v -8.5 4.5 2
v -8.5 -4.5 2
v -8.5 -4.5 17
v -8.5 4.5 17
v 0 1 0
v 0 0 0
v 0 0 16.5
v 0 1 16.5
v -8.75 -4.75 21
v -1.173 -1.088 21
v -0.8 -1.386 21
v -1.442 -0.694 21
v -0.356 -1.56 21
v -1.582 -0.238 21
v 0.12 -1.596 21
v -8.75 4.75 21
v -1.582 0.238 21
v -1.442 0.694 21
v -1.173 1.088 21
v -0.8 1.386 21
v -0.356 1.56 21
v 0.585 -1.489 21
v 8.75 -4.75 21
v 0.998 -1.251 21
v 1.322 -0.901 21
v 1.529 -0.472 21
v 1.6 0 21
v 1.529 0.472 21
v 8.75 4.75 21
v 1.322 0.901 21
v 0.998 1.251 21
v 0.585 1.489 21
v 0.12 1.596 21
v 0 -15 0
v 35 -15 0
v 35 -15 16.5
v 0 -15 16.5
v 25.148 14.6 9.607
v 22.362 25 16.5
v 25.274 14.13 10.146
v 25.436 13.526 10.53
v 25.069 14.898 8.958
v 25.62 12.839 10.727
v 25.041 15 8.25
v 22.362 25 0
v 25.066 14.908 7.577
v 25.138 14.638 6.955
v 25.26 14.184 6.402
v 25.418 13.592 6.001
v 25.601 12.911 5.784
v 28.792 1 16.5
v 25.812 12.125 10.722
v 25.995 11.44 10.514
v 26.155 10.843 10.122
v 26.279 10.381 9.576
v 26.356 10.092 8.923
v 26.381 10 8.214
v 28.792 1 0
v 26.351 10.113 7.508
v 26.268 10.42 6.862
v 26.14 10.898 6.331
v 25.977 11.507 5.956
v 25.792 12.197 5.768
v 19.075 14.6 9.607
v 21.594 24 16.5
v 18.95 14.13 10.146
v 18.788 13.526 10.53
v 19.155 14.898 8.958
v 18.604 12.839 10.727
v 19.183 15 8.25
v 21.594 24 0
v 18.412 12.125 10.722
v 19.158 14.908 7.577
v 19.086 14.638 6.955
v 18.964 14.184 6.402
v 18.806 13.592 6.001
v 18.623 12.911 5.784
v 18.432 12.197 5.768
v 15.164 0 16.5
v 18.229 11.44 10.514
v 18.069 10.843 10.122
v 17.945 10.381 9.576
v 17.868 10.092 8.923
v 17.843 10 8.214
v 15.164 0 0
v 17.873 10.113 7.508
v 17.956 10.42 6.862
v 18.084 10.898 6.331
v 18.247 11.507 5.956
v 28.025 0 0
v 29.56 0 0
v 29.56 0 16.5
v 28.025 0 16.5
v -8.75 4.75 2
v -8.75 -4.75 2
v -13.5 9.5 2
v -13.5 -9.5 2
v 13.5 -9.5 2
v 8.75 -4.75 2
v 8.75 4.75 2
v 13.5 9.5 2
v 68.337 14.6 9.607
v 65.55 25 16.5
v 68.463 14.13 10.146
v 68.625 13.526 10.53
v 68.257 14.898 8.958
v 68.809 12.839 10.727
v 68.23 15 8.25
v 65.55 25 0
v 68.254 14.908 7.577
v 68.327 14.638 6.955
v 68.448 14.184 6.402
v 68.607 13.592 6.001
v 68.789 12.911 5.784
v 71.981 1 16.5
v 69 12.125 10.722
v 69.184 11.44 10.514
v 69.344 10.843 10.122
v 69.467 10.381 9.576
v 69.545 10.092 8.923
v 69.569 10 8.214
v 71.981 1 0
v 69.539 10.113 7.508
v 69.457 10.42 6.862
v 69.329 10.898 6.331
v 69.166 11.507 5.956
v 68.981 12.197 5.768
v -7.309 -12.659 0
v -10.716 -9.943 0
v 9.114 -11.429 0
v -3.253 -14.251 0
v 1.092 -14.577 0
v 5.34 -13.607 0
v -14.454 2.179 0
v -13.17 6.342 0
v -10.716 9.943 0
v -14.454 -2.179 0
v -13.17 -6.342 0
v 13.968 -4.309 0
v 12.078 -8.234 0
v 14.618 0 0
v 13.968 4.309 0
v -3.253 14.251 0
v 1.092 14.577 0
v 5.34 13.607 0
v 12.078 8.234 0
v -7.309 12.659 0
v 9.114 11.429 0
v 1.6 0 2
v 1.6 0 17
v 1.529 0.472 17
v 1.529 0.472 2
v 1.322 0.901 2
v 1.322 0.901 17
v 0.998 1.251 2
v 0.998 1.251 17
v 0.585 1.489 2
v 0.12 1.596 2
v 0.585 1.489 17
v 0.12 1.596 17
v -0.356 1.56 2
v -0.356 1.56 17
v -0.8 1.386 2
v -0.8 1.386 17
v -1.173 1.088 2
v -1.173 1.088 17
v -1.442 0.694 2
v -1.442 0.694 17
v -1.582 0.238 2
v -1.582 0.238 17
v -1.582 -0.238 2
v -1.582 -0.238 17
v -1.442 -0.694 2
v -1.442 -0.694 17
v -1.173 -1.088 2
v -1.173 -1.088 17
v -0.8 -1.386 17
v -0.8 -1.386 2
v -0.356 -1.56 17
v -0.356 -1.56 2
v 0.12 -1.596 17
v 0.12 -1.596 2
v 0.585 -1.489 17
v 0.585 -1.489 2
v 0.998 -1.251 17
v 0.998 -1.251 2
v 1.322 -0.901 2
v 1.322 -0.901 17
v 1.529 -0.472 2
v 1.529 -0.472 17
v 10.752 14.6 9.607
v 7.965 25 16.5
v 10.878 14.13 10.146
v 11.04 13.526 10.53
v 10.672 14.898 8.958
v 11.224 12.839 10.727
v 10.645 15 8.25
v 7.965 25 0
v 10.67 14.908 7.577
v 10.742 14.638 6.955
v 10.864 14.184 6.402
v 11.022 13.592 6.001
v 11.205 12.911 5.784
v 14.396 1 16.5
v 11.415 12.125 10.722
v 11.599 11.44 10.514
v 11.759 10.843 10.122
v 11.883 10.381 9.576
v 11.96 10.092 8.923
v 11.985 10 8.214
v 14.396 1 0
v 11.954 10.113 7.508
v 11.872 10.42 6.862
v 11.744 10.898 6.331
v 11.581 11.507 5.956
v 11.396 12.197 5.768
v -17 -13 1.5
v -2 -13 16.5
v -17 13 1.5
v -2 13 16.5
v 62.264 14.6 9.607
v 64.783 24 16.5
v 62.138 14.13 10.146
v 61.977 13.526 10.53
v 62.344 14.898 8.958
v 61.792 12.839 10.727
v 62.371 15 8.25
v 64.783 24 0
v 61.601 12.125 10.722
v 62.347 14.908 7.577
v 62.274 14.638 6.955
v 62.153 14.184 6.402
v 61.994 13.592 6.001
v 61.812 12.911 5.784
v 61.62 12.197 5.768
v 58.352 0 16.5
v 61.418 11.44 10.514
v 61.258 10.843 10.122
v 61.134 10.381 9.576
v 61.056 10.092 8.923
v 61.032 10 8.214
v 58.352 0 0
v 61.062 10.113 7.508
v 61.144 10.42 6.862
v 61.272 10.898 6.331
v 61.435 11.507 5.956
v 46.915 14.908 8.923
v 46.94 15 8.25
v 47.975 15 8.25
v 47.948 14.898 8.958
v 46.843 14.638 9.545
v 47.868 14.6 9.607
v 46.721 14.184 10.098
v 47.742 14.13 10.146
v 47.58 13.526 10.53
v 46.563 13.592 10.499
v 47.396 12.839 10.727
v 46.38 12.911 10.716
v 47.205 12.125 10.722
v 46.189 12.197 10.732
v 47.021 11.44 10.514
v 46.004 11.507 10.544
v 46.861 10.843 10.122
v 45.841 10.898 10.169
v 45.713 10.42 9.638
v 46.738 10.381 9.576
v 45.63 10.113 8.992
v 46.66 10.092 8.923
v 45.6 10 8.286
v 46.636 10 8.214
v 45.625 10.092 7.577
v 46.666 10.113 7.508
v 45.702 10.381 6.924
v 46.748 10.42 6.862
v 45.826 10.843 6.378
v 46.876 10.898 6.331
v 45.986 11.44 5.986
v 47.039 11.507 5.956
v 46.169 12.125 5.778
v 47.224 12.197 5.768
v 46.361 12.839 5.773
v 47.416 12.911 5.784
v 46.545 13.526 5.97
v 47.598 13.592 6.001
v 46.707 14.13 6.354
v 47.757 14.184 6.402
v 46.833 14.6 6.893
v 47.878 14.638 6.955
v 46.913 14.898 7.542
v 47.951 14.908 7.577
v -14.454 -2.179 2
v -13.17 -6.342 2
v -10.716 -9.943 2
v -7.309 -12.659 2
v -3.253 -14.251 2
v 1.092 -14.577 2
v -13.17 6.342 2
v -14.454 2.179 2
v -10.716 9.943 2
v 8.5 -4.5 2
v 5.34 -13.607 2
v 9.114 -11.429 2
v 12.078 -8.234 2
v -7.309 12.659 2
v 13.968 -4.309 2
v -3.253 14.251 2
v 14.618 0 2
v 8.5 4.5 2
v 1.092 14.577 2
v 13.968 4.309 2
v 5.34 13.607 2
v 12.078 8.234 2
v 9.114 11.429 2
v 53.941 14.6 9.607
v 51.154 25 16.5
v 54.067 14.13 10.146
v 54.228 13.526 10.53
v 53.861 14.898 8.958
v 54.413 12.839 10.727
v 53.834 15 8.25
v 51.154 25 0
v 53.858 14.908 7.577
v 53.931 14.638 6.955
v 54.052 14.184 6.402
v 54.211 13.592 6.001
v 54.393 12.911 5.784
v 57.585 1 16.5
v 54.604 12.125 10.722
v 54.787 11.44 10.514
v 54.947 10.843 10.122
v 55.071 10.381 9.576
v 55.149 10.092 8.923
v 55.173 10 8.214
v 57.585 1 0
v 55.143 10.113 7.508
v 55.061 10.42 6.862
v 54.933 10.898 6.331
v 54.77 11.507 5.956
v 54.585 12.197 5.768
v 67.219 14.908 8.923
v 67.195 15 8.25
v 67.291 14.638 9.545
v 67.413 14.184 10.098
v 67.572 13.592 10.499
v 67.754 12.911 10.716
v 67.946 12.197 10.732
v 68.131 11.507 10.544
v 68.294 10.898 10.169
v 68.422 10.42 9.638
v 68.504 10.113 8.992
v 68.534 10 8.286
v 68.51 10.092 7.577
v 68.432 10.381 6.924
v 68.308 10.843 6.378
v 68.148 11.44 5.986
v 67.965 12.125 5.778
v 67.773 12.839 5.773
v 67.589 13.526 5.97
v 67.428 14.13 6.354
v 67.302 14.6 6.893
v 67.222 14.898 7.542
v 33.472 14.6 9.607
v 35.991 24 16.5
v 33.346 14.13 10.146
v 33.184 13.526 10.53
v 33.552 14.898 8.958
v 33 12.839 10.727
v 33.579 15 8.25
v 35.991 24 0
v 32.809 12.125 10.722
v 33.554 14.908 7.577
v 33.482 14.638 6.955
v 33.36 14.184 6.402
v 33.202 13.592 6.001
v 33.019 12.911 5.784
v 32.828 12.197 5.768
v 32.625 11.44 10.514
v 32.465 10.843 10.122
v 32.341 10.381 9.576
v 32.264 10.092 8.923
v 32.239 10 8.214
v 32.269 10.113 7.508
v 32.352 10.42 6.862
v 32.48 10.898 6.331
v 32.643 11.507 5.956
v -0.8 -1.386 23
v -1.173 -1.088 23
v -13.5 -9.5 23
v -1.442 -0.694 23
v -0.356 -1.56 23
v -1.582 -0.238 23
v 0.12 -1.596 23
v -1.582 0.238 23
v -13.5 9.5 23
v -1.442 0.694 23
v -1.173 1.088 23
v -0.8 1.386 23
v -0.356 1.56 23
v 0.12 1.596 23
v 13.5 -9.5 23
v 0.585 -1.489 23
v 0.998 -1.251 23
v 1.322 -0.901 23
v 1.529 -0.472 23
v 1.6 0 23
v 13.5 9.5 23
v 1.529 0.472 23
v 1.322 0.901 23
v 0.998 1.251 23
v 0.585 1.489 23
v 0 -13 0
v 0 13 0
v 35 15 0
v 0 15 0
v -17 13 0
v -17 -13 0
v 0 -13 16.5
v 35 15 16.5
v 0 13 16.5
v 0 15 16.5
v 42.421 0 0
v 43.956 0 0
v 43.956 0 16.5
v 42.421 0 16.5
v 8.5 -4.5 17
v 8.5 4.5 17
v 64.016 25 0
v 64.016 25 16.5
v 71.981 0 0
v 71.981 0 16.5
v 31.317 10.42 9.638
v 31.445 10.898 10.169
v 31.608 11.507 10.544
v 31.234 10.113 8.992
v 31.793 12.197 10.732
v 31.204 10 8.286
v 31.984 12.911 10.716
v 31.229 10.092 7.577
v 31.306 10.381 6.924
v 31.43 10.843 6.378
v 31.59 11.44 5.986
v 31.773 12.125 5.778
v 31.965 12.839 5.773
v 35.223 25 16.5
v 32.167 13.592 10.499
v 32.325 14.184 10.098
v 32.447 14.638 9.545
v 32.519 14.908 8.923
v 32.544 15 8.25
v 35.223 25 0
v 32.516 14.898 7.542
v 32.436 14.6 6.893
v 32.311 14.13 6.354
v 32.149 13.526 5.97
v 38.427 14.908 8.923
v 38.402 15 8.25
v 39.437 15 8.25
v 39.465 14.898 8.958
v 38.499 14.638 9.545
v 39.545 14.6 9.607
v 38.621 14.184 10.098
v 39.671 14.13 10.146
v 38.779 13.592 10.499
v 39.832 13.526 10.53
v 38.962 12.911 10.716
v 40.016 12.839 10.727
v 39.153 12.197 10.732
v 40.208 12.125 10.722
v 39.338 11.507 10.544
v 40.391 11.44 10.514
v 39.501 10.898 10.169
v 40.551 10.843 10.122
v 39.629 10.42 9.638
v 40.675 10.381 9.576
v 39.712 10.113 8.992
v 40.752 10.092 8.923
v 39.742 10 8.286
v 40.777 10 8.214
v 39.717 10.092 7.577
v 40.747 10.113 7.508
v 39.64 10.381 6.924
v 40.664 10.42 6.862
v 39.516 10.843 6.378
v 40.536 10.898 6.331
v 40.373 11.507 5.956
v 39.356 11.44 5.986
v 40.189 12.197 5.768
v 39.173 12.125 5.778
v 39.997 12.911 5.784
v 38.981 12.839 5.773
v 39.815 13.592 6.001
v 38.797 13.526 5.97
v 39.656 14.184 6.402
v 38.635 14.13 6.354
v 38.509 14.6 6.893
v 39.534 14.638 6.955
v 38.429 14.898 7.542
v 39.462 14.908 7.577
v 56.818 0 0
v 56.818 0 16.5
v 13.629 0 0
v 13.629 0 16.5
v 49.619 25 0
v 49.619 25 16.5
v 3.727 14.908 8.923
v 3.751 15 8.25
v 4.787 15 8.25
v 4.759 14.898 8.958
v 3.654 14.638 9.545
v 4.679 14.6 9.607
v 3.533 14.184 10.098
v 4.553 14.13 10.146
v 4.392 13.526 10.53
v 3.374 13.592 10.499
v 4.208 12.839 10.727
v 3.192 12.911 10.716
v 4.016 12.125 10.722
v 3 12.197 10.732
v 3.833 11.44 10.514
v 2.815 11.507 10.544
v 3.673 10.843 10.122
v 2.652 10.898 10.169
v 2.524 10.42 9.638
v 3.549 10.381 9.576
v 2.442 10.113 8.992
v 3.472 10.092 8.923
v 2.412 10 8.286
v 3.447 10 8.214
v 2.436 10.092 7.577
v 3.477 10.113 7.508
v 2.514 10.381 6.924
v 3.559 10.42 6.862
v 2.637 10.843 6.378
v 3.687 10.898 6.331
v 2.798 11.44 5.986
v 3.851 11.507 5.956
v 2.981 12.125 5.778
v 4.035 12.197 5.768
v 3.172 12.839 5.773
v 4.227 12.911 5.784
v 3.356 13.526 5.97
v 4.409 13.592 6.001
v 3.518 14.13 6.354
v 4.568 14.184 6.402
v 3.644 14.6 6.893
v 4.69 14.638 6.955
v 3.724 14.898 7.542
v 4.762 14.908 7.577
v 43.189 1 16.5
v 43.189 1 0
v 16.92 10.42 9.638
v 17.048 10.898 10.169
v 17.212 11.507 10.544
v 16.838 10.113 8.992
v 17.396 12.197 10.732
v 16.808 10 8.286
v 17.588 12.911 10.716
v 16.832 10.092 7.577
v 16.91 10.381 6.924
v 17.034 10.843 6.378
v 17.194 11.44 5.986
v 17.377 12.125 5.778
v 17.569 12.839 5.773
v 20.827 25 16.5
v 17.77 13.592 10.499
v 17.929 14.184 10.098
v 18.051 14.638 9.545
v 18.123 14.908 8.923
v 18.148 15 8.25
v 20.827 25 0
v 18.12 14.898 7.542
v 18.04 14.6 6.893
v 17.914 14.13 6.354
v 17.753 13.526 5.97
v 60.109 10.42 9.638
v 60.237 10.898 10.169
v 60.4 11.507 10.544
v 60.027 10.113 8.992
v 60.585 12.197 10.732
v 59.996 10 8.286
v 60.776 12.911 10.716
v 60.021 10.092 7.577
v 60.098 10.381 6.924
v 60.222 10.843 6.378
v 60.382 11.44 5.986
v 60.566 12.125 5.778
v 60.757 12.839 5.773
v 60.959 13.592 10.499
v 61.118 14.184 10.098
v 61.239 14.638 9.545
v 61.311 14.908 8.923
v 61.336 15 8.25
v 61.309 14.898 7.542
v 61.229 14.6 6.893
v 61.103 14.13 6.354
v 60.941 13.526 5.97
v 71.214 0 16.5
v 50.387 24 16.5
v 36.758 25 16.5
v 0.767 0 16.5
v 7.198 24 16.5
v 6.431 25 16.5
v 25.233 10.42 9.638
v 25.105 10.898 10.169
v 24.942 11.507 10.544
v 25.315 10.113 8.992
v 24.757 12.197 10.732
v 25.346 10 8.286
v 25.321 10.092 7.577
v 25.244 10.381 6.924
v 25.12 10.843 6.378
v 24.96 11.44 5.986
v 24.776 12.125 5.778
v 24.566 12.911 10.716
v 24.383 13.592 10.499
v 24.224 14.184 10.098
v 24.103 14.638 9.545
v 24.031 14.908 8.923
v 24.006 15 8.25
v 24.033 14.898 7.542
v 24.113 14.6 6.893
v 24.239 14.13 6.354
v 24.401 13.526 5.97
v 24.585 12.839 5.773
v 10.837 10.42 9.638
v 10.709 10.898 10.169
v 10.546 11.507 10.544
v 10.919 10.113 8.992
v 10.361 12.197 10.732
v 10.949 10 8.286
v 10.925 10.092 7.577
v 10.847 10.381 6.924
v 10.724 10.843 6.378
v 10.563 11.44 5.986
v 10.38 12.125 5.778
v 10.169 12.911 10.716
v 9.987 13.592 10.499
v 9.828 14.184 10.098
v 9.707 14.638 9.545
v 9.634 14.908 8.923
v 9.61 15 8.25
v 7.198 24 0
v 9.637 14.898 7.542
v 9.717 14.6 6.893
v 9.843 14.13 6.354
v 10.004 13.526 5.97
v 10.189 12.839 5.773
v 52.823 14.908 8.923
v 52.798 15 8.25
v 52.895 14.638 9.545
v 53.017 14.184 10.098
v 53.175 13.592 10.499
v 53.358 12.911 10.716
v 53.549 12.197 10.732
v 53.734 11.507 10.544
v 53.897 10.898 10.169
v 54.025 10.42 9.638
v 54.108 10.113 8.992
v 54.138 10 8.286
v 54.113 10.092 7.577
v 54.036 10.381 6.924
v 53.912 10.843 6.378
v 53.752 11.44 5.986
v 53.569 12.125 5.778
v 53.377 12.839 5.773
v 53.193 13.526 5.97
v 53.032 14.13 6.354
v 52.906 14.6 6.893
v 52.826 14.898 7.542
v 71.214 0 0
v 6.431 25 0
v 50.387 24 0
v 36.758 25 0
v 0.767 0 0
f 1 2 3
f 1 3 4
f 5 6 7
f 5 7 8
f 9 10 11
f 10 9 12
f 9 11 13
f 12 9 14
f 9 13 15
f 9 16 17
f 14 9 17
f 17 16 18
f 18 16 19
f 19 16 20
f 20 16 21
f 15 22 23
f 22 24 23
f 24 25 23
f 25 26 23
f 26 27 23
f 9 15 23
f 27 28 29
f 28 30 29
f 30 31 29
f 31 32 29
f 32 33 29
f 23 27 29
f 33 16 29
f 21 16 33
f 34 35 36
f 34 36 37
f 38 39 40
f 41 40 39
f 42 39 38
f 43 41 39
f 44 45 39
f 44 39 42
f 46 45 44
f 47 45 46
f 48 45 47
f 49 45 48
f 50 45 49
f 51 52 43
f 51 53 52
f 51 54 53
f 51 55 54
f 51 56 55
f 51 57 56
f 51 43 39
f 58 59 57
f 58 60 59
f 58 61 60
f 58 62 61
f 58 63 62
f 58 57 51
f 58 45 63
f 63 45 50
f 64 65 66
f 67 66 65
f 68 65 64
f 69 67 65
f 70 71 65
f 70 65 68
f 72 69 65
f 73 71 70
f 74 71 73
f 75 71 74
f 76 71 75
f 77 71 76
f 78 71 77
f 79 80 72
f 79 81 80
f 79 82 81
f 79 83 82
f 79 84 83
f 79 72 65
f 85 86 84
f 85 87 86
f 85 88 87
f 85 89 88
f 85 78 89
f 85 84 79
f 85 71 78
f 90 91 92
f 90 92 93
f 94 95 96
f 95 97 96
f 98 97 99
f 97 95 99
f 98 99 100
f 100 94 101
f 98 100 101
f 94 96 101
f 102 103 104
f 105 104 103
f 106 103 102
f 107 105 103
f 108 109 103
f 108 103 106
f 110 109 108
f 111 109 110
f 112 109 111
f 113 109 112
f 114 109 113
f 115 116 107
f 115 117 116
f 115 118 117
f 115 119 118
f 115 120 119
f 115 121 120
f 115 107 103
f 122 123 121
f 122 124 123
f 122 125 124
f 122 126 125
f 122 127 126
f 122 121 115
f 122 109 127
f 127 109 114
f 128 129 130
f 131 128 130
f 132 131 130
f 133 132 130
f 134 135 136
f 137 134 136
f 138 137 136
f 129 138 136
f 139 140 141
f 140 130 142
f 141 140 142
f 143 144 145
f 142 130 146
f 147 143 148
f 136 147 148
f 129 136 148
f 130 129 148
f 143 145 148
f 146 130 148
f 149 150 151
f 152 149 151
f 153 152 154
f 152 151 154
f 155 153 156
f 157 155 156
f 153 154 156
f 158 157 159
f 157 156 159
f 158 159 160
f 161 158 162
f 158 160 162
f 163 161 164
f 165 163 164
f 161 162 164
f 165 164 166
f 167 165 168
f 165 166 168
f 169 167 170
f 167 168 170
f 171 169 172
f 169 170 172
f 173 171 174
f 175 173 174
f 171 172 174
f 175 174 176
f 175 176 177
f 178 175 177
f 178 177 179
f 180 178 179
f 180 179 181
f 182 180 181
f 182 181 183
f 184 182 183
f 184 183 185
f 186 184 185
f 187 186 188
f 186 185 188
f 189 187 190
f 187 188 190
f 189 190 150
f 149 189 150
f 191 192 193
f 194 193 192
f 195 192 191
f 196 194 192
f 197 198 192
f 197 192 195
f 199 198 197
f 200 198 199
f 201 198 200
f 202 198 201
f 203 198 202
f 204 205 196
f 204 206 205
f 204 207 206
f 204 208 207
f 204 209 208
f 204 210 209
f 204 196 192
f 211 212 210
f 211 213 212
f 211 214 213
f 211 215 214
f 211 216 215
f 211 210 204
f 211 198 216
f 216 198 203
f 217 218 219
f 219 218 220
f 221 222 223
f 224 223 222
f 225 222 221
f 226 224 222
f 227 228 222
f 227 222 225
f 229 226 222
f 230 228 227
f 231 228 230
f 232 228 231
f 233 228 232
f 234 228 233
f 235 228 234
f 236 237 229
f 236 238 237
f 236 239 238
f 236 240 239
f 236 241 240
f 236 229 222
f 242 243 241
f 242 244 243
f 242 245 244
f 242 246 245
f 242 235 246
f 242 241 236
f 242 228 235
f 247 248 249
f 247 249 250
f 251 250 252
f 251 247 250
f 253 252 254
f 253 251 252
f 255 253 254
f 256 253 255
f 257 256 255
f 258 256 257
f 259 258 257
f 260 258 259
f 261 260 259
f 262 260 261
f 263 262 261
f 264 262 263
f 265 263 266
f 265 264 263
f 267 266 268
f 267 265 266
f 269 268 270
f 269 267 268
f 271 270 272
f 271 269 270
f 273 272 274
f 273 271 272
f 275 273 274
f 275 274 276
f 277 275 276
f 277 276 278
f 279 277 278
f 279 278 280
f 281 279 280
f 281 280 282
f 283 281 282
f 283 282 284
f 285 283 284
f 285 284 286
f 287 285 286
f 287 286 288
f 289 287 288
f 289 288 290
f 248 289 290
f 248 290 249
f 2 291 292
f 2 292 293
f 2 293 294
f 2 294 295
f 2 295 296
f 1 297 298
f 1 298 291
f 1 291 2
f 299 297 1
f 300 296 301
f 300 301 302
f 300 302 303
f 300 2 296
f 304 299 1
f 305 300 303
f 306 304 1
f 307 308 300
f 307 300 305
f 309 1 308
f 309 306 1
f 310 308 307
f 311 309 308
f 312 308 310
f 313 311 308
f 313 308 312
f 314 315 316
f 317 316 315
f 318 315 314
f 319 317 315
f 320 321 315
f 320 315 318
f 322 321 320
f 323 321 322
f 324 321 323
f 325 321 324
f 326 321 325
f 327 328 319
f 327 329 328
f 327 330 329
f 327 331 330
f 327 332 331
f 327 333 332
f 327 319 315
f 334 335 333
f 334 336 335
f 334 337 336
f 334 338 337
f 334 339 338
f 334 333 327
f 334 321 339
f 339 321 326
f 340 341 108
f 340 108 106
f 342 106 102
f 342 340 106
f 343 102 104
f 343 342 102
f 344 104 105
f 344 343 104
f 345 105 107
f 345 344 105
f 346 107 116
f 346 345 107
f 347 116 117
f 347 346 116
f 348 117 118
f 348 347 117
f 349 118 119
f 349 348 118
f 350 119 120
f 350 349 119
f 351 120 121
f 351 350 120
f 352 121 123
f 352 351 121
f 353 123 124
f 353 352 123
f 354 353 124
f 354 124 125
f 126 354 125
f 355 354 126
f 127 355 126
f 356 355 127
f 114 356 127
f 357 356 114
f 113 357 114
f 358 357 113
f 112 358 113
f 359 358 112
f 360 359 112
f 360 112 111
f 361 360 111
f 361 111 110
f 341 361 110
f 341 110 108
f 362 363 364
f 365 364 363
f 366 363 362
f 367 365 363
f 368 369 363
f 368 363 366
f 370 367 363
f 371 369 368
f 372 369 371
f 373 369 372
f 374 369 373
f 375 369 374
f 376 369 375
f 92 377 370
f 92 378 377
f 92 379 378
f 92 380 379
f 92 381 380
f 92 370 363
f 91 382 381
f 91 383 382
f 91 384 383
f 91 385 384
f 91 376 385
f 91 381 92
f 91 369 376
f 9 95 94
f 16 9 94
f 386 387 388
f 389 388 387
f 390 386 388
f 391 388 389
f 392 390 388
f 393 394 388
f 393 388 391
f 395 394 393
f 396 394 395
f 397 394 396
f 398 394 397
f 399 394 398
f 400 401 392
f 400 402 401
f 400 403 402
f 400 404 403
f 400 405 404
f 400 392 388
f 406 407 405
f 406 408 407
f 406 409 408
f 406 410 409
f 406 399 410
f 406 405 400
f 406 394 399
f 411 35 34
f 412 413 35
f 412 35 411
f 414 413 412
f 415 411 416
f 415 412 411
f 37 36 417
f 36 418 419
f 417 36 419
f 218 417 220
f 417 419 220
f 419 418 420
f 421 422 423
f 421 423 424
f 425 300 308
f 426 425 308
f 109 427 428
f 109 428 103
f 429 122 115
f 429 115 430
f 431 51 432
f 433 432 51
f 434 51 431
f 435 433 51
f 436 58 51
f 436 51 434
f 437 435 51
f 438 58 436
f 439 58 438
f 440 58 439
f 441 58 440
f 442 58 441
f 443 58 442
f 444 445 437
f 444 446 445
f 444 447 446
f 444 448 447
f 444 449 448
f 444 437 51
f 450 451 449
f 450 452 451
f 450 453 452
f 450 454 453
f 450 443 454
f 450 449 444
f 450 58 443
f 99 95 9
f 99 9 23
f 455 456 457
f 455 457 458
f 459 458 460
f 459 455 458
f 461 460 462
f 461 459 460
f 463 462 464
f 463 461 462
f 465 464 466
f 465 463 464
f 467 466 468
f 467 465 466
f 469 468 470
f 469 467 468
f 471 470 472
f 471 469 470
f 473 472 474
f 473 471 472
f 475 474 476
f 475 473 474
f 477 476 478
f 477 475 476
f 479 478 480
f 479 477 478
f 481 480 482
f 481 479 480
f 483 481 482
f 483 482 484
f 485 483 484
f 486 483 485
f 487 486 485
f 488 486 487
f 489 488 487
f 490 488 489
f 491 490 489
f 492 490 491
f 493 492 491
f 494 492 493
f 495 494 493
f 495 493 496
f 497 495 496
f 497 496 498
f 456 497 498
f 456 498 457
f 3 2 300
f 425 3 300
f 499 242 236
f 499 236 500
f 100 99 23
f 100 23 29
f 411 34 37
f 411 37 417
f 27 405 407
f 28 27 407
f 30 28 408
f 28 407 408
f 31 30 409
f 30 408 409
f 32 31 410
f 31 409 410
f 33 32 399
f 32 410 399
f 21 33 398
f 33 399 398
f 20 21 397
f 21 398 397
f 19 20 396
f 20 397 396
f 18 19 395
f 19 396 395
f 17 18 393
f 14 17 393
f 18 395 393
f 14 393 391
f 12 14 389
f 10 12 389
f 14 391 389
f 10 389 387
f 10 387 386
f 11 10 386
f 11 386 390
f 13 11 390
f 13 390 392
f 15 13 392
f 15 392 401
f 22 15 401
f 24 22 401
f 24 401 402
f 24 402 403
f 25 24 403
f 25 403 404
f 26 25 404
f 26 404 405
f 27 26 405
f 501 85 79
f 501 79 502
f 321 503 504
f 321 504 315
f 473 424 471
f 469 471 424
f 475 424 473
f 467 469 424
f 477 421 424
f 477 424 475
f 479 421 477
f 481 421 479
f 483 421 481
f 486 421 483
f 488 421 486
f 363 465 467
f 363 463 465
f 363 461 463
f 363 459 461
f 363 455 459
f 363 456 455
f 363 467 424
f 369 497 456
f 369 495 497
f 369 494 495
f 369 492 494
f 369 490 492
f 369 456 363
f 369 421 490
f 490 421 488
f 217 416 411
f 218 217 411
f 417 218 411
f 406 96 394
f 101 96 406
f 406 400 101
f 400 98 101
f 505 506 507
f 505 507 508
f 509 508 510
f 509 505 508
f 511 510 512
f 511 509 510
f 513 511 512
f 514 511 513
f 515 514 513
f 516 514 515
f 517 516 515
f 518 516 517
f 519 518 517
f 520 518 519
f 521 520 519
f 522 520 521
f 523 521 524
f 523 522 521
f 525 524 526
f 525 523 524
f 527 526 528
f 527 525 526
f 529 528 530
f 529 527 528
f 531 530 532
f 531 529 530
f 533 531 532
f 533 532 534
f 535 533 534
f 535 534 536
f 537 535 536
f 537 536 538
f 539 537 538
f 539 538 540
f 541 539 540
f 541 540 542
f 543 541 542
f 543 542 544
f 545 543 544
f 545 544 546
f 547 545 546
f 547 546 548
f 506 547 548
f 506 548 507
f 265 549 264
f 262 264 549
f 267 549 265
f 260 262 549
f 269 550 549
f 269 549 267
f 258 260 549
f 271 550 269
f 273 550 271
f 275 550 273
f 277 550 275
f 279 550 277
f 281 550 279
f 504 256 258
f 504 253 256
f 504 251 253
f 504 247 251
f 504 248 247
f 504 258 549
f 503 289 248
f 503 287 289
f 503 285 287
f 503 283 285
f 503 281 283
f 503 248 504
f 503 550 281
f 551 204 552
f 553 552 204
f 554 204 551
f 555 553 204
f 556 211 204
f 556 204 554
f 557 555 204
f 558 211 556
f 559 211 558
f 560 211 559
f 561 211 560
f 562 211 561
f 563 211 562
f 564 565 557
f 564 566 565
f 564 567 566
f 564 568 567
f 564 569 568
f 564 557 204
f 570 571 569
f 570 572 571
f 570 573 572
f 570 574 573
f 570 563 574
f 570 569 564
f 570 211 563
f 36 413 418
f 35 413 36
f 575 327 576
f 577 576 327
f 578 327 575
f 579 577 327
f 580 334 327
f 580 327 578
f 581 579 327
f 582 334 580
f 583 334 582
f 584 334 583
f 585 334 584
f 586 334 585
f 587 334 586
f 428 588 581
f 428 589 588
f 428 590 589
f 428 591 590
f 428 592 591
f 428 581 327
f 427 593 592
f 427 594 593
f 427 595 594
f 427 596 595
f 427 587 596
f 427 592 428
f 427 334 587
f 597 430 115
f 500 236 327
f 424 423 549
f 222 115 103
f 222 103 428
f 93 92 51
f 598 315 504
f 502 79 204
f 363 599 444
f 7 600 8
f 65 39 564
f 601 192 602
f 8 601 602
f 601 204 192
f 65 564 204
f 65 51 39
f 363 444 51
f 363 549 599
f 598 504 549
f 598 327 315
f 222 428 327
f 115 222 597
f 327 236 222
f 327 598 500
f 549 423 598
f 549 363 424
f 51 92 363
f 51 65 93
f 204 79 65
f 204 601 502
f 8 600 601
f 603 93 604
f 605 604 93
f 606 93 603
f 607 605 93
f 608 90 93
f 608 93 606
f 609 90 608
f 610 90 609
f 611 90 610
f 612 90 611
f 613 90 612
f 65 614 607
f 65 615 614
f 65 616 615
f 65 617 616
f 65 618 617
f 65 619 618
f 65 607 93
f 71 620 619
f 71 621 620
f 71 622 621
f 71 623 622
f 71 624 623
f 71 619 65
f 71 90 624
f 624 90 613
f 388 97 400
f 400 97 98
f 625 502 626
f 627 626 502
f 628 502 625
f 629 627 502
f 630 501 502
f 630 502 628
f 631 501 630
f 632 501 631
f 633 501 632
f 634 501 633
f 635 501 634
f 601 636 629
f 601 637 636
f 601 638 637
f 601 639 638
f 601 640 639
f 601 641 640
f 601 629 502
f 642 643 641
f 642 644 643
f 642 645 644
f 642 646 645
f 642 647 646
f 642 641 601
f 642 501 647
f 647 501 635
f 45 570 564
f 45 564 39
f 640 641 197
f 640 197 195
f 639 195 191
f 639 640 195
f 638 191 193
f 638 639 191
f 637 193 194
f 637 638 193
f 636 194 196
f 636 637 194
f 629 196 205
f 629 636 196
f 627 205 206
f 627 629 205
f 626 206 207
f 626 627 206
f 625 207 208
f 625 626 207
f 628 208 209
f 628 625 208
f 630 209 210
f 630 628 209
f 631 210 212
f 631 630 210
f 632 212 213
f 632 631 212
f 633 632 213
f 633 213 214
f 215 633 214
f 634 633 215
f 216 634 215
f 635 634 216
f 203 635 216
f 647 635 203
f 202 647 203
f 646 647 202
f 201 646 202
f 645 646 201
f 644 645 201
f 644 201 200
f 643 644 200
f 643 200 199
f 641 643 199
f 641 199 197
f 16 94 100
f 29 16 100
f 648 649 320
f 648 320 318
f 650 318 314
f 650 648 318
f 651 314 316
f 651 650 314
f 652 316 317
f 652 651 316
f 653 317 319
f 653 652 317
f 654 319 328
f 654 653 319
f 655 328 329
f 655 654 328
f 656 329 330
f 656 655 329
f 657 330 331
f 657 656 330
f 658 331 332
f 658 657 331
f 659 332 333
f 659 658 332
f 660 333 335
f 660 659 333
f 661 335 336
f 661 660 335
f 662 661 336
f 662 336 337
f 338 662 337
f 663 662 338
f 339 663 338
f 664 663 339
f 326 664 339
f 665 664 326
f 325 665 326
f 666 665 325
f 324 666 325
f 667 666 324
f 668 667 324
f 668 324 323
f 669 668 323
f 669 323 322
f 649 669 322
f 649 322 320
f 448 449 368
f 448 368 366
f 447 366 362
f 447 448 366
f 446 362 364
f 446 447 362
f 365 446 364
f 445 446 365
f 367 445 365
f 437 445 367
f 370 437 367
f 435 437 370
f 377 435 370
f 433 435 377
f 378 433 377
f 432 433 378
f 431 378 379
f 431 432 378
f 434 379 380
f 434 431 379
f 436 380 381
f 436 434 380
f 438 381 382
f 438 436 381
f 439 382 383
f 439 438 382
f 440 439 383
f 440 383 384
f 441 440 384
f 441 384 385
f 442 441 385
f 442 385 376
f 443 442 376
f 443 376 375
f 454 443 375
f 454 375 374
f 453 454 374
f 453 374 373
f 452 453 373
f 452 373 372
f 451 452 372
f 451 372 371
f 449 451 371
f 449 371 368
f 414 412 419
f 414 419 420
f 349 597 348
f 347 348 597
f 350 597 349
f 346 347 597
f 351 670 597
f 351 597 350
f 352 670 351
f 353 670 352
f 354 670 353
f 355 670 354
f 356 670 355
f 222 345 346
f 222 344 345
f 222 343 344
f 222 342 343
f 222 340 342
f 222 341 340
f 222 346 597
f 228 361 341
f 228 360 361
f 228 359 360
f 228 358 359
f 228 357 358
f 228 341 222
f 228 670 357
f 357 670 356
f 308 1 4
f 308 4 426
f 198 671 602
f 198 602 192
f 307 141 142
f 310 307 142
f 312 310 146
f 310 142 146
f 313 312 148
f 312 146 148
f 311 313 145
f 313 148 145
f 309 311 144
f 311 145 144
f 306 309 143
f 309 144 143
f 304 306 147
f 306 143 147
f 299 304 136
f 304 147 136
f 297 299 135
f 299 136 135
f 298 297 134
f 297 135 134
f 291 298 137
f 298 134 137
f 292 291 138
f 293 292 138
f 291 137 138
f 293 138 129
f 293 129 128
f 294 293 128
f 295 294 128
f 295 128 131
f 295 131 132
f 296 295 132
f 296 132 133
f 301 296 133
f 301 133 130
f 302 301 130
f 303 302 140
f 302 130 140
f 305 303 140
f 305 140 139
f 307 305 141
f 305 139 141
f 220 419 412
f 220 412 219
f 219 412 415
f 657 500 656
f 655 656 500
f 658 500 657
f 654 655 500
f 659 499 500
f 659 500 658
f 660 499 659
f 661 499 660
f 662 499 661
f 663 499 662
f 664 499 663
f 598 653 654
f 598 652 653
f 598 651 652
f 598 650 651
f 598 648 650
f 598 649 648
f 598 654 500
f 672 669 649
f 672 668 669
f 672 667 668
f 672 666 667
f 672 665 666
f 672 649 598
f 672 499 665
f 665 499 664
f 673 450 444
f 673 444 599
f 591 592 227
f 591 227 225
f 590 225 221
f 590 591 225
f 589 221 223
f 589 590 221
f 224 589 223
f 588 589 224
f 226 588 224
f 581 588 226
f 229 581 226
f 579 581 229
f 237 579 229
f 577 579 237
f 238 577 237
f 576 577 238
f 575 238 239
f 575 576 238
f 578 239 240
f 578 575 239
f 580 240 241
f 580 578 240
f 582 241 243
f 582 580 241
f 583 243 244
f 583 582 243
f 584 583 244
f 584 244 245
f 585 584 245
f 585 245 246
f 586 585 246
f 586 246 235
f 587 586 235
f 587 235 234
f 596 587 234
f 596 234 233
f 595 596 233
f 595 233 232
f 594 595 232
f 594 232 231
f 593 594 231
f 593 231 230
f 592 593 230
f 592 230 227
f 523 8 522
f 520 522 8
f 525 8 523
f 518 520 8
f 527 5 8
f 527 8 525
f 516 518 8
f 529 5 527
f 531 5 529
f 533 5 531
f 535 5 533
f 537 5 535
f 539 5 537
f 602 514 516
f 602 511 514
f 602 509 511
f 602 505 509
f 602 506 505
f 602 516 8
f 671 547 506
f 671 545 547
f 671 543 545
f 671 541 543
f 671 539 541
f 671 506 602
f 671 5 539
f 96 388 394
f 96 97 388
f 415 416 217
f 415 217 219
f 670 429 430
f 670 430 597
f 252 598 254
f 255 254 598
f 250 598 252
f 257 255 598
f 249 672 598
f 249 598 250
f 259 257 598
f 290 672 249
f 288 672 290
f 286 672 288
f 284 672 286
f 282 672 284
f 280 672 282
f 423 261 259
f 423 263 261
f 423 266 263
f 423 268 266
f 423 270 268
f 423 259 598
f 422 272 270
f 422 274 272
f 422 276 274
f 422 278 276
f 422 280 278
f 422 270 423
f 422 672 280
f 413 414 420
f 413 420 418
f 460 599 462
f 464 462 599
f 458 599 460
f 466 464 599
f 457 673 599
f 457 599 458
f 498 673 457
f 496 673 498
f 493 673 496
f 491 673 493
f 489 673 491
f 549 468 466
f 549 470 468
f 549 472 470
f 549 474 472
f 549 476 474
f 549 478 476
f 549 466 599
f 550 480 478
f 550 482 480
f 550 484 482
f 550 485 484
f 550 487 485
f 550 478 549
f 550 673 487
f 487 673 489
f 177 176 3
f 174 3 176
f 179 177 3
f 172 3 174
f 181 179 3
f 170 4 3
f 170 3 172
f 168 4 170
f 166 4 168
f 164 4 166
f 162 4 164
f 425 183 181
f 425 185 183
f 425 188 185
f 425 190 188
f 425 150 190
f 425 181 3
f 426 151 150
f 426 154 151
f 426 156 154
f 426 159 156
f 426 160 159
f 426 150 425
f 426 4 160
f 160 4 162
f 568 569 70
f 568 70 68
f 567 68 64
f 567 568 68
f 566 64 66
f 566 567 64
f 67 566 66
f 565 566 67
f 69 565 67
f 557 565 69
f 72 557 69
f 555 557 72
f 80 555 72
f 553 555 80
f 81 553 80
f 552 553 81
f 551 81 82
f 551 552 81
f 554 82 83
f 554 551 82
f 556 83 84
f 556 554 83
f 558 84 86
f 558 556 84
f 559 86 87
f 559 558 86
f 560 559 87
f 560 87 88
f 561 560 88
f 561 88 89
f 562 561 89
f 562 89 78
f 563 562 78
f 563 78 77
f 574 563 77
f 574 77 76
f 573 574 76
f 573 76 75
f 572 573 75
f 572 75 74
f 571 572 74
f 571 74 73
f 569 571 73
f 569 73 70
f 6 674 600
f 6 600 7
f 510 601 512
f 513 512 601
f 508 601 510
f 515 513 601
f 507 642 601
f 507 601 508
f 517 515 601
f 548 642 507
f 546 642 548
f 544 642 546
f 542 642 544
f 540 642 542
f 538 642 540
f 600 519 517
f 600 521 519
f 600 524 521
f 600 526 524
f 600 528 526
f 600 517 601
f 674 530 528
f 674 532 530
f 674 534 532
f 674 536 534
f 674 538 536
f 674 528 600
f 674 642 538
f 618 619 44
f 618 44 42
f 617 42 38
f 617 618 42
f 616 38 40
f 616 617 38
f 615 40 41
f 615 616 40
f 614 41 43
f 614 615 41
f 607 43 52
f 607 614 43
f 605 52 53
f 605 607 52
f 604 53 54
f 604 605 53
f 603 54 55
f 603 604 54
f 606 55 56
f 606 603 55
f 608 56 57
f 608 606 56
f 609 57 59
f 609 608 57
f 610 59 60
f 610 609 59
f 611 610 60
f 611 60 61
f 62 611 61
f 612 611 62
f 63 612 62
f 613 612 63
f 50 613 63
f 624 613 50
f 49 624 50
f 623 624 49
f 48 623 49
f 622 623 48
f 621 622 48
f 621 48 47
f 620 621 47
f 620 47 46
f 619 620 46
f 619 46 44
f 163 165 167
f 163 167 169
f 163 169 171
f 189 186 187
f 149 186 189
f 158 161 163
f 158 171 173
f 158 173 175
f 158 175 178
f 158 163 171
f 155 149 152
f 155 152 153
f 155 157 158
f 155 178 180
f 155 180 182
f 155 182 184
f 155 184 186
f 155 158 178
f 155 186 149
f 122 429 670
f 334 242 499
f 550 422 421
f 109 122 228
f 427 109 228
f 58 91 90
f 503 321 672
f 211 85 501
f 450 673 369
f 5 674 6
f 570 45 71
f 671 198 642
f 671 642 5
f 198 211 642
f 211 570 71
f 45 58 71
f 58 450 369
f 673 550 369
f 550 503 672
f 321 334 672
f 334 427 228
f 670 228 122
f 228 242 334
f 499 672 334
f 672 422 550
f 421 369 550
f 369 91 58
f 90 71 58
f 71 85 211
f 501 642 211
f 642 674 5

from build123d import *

# Parameters (mm, degrees)
SKETCH_R             = 14.617692
PAD_DEPTH            = 2
SKETCH001_W          = 17
SKETCH001_H          = 9
PAD001_DEPTH         = 15
SKETCH002_R          = 1.6
POCKET_DEPTH         = 15
PAD002_DEPTH         = 16.5
CHAMFER_SIZE         = 15
PAD003_DEPTH         = 16.5
SKETCH010_R          = 2.5
POCKET002_DEPTH      = 0.001
POCKET002_DEPTH_BACK = -71.982076
SKETCH007_W          = 27
SKETCH007_H          = 19
SKETCH007_W_2        = 17.5
SKETCH007_H_2        = 9.5
PAD004_DEPTH         = 19
SKETCH008_W          = 27
SKETCH008_H          = 19
PAD005_DEPTH         = 2
SKETCH009_R          = 1.6
POCKET001_DEPTH      = 21.001


with BuildPart() as bolt:
    # Sketch → Pad (new body)
    with BuildSketch(Plane.XY):
        Circle(SKETCH_R)
    extrude(amount=PAD_DEPTH)

    # Sketch001 (on DatumPlane) → Pad001 (join)
    with BuildSketch(Plane.XY.offset(2)):
        Rectangle(SKETCH001_W, SKETCH001_H)
    extrude(amount=PAD001_DEPTH)

    # Sketch002 (on DatumPlane) → Pocket (cut)
    with BuildSketch(Plane.XY.offset(17)):
        Circle(SKETCH002_R)
    extrude(amount=-POCKET_DEPTH, mode=Mode.SUBTRACT)


with BuildPart() as latch:
    # Sketch003 → Pad002 (new body)
    with BuildSketch(Plane.XY):
        Polygon((-17, 13), (-2, 13), (0, 13), (0, 15), (35, 15), (35, -15), (0, -15), (0, -13), (-2, -13), (-17, -13), align=None)
    extrude(amount=PAD002_DEPTH)

    # Chamfer
    chamfer_edges = [latch.edges().sort_by_distance(p)[0] for p in [
        (-17, 0, 16.5),
    ]]
    chamfer(chamfer_edges, length=CHAMFER_SIZE)


with BuildPart() as spring:
    # Sketch005 → Pad003 (new body)
    with BuildSketch(Plane.XY):
        Polygon((0, 1), (6.430781, 25), (7.965435, 25), (14.396215, 1), (20.826996, 25), (22.36165, 25), (28.79243, 1), (35.223211, 25), (36.757865, 25), (43.188646, 1), (49.619426, 25), (51.15408, 25), (57.584861, 1), (64.015641, 25), (65.550295, 25), (71.981076, 1), (71.981076, 0), (71.213749, 0), (64.782968, 24), (58.352188, 0), (56.817534, 0), (50.386753, 24), (43.955973, 0), (42.421319, 0), (35.990538, 24), (29.559757, 0), (28.025103, 0), (21.594323, 24), (15.163542, 0), (13.628888, 0), (7.198108, 24), (0.767327, 0), (0, 0), align=None)
    extrude(amount=PAD003_DEPTH)

    # Sketch010 → Pocket002 (cut, two sides)
    with BuildSketch(Plane.YZ) as pocket002_sk:
        with Locations((12.5, 8.25)):
            Circle(SKETCH010_R)
    extrude(amount=-POCKET002_DEPTH, mode=Mode.SUBTRACT)
    extrude(pocket002_sk.sketch, amount=-POCKET002_DEPTH_BACK, mode=Mode.SUBTRACT)


with BuildPart() as counterbolt:
    # Sketch007 (on Origin) → Pad004 (new body)
    with BuildSketch(Plane.XY.offset(2)):
        Rectangle(SKETCH007_W, SKETCH007_H)
        Rectangle(SKETCH007_W_2, SKETCH007_H_2, mode=Mode.SUBTRACT)
    extrude(amount=PAD004_DEPTH)

    # Sketch008 (on DatumPlane) → Pad005 (join)
    with BuildSketch(Plane.XY.offset(21)):
        Rectangle(SKETCH008_W, SKETCH008_H)
    extrude(amount=PAD005_DEPTH)

    # Sketch009 (on DatumPlane) → Pocket001 (cut, through all)
    with BuildSketch(Plane.XY.offset(23)):
        Circle(SKETCH009_R)
    extrude(amount=-POCKET001_DEPTH, mode=Mode.SUBTRACT)


solid = Compound([bolt.part, latch.part, spring.part, counterbolt.part])
